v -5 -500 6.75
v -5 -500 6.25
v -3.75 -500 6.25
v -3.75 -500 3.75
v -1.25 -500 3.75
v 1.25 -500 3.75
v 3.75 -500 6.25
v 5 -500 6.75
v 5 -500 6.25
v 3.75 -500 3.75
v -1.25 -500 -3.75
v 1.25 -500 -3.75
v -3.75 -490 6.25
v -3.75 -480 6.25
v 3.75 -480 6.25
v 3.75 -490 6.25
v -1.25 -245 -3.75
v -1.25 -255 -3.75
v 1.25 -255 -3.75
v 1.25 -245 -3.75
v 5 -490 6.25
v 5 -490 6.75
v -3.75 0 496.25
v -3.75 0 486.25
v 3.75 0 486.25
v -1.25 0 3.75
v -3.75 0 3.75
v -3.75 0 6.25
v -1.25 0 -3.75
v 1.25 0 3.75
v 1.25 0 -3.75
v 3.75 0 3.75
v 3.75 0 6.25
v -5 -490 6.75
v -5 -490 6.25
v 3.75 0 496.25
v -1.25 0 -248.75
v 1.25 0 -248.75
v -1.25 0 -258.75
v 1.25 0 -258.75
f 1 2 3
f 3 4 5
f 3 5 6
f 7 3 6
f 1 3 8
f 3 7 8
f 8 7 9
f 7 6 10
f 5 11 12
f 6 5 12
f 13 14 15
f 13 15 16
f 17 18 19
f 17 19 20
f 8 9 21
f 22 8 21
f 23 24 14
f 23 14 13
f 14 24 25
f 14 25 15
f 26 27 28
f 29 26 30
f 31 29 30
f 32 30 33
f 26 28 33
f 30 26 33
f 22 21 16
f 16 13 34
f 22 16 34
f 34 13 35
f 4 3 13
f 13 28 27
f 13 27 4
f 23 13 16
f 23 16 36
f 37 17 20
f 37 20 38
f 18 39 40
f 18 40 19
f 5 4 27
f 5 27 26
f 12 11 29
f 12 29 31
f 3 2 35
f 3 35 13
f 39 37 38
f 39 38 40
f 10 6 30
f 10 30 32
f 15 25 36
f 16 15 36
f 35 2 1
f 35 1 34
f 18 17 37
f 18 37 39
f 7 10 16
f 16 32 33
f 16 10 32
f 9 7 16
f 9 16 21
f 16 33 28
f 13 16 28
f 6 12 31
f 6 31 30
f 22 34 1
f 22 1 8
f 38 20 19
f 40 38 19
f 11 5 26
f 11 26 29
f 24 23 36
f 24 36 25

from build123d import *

# Parameters (mm, degrees)
F1_DEPTH = 500
F3_DEPTH = 7.5
F5_DEPTH = 2.5
F6_W     = 1.25
F6_H     = 10
F6_W_2   = 7.5
F7_DEPTH = 0.5


with BuildPart() as f1:
    # F0 (on Front) → F1 (new body)
    with BuildSketch(Plane.XZ):
        Polygon((-1.25, 3.75), (-1.25, -3.75), (1.25, -3.75), (1.25, 3.75), (3.75, 3.75), (3.75, 6.25), (-3.75, 6.25), (-3.75, 3.75), align=None)
    extrude(amount=F1_DEPTH)

    # F6 (on face) → F7 (join)
    with BuildSketch(Plane.XY.offset(6.25)):
        with Locations((4.375, -495)):
            Rectangle(F6_W, F6_H)
        with Locations((0, -495)):
            Rectangle(F6_W_2, F6_H)
        with Locations((-4.375, -495)):
            Rectangle(F6_W, F6_H)
    extrude(amount=F7_DEPTH)


with BuildPart() as f3:
    # F2 (on face) → F3 (new body)
    with BuildSketch(Plane(origin=(-3.75, 0, 0), x_dir=(0, -1, 0), z_dir=(-1, 0, 0))):
        Polygon((490, 6.25), (0, 496.25), (0, 486.25), (480, 6.25), align=None)
    extrude(amount=-F3_DEPTH)


with BuildPart() as f5:
    # F4 (on face) → F5 (new body)
    with BuildSketch(Plane(origin=(-1.25, 0, 0), x_dir=(0, -1, 0), z_dir=(-1, 0, 0))):
        Polygon((245, -3.75), (0, -248.75), (0, -258.75), (255, -3.75), align=None)
    extrude(amount=-F5_DEPTH)


solid = Compound([f1.part, f3.part, f5.part])
